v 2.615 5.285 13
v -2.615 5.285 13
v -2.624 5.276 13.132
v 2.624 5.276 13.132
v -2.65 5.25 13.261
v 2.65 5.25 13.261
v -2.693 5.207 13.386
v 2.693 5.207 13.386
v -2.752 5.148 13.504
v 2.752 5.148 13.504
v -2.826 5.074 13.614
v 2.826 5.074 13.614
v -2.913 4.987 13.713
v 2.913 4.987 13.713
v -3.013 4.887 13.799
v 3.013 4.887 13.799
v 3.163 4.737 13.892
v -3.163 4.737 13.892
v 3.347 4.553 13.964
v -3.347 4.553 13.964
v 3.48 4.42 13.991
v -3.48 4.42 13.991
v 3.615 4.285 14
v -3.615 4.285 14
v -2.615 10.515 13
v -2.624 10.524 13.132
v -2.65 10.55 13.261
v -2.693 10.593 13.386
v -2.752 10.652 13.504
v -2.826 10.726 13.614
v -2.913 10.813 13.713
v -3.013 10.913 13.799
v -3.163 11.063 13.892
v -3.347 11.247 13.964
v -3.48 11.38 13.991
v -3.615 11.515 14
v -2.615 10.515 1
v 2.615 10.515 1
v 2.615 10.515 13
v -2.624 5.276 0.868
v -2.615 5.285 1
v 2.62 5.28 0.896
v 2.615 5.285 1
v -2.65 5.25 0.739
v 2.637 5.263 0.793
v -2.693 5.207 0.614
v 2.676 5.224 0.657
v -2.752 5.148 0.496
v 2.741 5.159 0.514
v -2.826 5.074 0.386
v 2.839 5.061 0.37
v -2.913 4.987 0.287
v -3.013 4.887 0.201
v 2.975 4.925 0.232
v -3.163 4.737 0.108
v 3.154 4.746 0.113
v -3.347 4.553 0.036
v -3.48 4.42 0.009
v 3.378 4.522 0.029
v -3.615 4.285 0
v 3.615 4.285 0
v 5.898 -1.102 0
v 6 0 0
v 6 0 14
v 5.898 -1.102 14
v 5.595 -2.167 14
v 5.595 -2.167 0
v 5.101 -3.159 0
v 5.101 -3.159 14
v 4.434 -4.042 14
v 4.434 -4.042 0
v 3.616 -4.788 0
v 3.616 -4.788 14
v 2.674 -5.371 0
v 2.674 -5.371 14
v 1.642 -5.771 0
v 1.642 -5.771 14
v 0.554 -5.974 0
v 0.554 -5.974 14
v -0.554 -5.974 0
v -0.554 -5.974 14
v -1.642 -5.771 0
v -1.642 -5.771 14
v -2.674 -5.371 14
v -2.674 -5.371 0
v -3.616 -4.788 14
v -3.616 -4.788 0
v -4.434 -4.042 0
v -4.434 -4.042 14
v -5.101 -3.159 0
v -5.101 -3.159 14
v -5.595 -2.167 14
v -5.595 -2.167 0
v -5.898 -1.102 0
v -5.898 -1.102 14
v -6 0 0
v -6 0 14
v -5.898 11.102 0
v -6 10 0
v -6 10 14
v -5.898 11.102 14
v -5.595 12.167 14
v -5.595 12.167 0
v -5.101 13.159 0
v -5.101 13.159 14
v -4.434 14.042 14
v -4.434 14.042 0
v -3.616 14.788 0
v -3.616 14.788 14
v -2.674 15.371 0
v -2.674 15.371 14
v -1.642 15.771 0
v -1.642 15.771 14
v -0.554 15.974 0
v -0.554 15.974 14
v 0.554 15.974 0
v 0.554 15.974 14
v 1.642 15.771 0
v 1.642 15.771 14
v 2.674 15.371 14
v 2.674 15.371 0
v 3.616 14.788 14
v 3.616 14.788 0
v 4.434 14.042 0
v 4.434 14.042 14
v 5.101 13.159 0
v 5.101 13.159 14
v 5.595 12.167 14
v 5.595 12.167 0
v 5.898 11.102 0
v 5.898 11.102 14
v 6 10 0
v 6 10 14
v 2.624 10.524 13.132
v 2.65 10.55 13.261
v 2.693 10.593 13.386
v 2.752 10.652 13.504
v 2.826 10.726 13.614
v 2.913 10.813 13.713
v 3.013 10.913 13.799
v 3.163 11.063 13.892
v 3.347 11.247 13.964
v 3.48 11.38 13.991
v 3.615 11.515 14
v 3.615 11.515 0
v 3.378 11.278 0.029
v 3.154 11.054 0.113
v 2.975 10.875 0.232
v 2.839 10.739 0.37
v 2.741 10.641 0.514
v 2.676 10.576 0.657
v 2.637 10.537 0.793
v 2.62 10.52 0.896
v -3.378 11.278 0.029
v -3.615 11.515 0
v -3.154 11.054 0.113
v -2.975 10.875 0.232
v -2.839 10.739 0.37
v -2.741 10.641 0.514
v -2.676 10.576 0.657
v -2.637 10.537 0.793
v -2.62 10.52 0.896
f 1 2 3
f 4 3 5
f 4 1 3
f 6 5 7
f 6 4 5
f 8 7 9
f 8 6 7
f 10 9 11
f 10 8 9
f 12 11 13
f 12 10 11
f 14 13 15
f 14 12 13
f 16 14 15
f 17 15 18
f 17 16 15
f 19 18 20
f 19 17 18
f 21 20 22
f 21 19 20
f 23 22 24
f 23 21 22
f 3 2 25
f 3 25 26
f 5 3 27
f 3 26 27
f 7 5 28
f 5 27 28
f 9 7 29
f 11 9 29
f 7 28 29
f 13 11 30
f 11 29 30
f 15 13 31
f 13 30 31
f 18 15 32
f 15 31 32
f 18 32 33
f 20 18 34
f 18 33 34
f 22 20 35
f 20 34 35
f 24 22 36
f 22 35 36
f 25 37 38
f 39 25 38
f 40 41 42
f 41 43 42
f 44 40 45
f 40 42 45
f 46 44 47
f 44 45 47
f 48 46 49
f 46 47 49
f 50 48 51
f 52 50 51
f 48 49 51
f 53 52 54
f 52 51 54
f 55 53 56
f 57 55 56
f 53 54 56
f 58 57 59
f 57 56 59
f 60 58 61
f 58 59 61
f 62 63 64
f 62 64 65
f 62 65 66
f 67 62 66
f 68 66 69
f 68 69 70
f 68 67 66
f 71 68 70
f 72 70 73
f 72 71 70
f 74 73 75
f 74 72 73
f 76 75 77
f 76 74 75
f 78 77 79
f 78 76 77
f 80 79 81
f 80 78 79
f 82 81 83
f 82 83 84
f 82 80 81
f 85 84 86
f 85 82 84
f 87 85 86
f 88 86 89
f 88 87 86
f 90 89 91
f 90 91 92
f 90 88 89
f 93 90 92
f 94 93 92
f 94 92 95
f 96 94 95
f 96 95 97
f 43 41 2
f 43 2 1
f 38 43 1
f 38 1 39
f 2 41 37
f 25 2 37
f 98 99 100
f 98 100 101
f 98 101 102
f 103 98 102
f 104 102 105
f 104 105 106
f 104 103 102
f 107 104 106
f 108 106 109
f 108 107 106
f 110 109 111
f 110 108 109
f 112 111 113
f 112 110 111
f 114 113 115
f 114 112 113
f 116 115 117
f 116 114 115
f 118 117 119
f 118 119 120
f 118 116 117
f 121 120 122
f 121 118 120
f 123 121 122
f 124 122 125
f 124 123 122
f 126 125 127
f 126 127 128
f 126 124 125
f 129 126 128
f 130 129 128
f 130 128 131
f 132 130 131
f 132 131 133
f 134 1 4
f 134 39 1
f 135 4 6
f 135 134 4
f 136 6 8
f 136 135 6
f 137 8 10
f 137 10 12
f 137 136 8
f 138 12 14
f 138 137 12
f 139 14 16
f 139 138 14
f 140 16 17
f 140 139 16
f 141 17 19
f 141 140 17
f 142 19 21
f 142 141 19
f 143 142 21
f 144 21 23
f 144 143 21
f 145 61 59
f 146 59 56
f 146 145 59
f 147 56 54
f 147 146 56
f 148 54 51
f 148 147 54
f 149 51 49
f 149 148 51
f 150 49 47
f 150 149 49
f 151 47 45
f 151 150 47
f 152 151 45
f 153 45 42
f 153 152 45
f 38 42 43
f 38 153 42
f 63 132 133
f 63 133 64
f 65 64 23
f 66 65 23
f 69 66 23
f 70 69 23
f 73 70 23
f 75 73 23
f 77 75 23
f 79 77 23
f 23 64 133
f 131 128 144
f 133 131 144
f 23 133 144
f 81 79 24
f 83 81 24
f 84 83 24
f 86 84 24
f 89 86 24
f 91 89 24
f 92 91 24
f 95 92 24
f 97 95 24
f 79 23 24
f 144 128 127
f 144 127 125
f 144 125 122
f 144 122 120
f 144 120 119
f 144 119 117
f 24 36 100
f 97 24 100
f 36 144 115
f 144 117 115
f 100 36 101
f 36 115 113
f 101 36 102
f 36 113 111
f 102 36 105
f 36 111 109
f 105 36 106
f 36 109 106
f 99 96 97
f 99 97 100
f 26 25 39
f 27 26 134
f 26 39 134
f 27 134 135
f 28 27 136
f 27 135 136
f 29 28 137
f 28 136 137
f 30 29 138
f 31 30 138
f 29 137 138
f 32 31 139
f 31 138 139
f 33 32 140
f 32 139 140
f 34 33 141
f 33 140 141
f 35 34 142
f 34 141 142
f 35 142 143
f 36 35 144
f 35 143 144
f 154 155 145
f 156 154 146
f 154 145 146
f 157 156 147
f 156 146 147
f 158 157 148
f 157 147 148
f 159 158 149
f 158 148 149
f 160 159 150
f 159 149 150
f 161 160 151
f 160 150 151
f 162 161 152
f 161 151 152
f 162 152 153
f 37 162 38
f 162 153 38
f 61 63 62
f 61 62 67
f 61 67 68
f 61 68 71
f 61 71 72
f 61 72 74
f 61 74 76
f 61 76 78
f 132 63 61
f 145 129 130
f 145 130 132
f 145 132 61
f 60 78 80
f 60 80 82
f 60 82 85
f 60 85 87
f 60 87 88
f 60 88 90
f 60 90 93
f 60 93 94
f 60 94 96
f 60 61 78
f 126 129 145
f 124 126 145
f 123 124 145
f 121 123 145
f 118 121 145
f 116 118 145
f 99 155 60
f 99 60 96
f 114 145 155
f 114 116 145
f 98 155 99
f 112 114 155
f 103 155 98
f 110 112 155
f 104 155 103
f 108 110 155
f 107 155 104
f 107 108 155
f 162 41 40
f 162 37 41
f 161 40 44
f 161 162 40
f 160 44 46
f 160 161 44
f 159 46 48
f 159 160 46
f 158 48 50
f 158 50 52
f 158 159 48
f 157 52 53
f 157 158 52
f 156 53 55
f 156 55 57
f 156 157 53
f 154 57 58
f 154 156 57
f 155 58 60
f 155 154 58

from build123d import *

# Parameters (mm, degrees)
SKETCH1_W           = 5.23
SKETCH1_H           = 5.23
BOSS_EXTRUDE1_DEPTH = 14
FILLET1_R           = 1
FILLET2_R           = 1


with BuildPart() as part:
    # Sketch1 → Boss-Extrude1 (new body)
    with BuildSketch(Plane.XY):
        with BuildLine():
            Line((-6, 0), (-6, 10))
            ThreePointArc((-6, 10), (0, 16), (6, 10))
            Line((6, 10), (6, 0))
            ThreePointArc((6, 0), (0, -6), (-6, 0))
        make_face()
        with Locations((0, 7.9)):
            Rectangle(SKETCH1_W, SKETCH1_H, mode=Mode.SUBTRACT)
    extrude(amount=BOSS_EXTRUDE1_DEPTH)

    # Fillet1
    fillet1_edges = [part.edges().sort_by_distance(p)[0] for p in [
        (2.615, 7.9, 14),
        (0, 10.515, 14),
        (-2.615, 7.9, 14),
        (0, 5.285, 14),
    ]]
    fillet(fillet1_edges, radius=FILLET1_R)

    # Fillet2
    fillet2_edges = [part.edges().sort_by_distance(p)[0] for p in [
        (2.615, 7.9, 0),
        (0, 10.515, 0),
        (-2.615, 7.9, 0),
        (0, 5.285, 0),
    ]]
    fillet(fillet2_edges, radius=FILLET2_R)


solid = part.part
